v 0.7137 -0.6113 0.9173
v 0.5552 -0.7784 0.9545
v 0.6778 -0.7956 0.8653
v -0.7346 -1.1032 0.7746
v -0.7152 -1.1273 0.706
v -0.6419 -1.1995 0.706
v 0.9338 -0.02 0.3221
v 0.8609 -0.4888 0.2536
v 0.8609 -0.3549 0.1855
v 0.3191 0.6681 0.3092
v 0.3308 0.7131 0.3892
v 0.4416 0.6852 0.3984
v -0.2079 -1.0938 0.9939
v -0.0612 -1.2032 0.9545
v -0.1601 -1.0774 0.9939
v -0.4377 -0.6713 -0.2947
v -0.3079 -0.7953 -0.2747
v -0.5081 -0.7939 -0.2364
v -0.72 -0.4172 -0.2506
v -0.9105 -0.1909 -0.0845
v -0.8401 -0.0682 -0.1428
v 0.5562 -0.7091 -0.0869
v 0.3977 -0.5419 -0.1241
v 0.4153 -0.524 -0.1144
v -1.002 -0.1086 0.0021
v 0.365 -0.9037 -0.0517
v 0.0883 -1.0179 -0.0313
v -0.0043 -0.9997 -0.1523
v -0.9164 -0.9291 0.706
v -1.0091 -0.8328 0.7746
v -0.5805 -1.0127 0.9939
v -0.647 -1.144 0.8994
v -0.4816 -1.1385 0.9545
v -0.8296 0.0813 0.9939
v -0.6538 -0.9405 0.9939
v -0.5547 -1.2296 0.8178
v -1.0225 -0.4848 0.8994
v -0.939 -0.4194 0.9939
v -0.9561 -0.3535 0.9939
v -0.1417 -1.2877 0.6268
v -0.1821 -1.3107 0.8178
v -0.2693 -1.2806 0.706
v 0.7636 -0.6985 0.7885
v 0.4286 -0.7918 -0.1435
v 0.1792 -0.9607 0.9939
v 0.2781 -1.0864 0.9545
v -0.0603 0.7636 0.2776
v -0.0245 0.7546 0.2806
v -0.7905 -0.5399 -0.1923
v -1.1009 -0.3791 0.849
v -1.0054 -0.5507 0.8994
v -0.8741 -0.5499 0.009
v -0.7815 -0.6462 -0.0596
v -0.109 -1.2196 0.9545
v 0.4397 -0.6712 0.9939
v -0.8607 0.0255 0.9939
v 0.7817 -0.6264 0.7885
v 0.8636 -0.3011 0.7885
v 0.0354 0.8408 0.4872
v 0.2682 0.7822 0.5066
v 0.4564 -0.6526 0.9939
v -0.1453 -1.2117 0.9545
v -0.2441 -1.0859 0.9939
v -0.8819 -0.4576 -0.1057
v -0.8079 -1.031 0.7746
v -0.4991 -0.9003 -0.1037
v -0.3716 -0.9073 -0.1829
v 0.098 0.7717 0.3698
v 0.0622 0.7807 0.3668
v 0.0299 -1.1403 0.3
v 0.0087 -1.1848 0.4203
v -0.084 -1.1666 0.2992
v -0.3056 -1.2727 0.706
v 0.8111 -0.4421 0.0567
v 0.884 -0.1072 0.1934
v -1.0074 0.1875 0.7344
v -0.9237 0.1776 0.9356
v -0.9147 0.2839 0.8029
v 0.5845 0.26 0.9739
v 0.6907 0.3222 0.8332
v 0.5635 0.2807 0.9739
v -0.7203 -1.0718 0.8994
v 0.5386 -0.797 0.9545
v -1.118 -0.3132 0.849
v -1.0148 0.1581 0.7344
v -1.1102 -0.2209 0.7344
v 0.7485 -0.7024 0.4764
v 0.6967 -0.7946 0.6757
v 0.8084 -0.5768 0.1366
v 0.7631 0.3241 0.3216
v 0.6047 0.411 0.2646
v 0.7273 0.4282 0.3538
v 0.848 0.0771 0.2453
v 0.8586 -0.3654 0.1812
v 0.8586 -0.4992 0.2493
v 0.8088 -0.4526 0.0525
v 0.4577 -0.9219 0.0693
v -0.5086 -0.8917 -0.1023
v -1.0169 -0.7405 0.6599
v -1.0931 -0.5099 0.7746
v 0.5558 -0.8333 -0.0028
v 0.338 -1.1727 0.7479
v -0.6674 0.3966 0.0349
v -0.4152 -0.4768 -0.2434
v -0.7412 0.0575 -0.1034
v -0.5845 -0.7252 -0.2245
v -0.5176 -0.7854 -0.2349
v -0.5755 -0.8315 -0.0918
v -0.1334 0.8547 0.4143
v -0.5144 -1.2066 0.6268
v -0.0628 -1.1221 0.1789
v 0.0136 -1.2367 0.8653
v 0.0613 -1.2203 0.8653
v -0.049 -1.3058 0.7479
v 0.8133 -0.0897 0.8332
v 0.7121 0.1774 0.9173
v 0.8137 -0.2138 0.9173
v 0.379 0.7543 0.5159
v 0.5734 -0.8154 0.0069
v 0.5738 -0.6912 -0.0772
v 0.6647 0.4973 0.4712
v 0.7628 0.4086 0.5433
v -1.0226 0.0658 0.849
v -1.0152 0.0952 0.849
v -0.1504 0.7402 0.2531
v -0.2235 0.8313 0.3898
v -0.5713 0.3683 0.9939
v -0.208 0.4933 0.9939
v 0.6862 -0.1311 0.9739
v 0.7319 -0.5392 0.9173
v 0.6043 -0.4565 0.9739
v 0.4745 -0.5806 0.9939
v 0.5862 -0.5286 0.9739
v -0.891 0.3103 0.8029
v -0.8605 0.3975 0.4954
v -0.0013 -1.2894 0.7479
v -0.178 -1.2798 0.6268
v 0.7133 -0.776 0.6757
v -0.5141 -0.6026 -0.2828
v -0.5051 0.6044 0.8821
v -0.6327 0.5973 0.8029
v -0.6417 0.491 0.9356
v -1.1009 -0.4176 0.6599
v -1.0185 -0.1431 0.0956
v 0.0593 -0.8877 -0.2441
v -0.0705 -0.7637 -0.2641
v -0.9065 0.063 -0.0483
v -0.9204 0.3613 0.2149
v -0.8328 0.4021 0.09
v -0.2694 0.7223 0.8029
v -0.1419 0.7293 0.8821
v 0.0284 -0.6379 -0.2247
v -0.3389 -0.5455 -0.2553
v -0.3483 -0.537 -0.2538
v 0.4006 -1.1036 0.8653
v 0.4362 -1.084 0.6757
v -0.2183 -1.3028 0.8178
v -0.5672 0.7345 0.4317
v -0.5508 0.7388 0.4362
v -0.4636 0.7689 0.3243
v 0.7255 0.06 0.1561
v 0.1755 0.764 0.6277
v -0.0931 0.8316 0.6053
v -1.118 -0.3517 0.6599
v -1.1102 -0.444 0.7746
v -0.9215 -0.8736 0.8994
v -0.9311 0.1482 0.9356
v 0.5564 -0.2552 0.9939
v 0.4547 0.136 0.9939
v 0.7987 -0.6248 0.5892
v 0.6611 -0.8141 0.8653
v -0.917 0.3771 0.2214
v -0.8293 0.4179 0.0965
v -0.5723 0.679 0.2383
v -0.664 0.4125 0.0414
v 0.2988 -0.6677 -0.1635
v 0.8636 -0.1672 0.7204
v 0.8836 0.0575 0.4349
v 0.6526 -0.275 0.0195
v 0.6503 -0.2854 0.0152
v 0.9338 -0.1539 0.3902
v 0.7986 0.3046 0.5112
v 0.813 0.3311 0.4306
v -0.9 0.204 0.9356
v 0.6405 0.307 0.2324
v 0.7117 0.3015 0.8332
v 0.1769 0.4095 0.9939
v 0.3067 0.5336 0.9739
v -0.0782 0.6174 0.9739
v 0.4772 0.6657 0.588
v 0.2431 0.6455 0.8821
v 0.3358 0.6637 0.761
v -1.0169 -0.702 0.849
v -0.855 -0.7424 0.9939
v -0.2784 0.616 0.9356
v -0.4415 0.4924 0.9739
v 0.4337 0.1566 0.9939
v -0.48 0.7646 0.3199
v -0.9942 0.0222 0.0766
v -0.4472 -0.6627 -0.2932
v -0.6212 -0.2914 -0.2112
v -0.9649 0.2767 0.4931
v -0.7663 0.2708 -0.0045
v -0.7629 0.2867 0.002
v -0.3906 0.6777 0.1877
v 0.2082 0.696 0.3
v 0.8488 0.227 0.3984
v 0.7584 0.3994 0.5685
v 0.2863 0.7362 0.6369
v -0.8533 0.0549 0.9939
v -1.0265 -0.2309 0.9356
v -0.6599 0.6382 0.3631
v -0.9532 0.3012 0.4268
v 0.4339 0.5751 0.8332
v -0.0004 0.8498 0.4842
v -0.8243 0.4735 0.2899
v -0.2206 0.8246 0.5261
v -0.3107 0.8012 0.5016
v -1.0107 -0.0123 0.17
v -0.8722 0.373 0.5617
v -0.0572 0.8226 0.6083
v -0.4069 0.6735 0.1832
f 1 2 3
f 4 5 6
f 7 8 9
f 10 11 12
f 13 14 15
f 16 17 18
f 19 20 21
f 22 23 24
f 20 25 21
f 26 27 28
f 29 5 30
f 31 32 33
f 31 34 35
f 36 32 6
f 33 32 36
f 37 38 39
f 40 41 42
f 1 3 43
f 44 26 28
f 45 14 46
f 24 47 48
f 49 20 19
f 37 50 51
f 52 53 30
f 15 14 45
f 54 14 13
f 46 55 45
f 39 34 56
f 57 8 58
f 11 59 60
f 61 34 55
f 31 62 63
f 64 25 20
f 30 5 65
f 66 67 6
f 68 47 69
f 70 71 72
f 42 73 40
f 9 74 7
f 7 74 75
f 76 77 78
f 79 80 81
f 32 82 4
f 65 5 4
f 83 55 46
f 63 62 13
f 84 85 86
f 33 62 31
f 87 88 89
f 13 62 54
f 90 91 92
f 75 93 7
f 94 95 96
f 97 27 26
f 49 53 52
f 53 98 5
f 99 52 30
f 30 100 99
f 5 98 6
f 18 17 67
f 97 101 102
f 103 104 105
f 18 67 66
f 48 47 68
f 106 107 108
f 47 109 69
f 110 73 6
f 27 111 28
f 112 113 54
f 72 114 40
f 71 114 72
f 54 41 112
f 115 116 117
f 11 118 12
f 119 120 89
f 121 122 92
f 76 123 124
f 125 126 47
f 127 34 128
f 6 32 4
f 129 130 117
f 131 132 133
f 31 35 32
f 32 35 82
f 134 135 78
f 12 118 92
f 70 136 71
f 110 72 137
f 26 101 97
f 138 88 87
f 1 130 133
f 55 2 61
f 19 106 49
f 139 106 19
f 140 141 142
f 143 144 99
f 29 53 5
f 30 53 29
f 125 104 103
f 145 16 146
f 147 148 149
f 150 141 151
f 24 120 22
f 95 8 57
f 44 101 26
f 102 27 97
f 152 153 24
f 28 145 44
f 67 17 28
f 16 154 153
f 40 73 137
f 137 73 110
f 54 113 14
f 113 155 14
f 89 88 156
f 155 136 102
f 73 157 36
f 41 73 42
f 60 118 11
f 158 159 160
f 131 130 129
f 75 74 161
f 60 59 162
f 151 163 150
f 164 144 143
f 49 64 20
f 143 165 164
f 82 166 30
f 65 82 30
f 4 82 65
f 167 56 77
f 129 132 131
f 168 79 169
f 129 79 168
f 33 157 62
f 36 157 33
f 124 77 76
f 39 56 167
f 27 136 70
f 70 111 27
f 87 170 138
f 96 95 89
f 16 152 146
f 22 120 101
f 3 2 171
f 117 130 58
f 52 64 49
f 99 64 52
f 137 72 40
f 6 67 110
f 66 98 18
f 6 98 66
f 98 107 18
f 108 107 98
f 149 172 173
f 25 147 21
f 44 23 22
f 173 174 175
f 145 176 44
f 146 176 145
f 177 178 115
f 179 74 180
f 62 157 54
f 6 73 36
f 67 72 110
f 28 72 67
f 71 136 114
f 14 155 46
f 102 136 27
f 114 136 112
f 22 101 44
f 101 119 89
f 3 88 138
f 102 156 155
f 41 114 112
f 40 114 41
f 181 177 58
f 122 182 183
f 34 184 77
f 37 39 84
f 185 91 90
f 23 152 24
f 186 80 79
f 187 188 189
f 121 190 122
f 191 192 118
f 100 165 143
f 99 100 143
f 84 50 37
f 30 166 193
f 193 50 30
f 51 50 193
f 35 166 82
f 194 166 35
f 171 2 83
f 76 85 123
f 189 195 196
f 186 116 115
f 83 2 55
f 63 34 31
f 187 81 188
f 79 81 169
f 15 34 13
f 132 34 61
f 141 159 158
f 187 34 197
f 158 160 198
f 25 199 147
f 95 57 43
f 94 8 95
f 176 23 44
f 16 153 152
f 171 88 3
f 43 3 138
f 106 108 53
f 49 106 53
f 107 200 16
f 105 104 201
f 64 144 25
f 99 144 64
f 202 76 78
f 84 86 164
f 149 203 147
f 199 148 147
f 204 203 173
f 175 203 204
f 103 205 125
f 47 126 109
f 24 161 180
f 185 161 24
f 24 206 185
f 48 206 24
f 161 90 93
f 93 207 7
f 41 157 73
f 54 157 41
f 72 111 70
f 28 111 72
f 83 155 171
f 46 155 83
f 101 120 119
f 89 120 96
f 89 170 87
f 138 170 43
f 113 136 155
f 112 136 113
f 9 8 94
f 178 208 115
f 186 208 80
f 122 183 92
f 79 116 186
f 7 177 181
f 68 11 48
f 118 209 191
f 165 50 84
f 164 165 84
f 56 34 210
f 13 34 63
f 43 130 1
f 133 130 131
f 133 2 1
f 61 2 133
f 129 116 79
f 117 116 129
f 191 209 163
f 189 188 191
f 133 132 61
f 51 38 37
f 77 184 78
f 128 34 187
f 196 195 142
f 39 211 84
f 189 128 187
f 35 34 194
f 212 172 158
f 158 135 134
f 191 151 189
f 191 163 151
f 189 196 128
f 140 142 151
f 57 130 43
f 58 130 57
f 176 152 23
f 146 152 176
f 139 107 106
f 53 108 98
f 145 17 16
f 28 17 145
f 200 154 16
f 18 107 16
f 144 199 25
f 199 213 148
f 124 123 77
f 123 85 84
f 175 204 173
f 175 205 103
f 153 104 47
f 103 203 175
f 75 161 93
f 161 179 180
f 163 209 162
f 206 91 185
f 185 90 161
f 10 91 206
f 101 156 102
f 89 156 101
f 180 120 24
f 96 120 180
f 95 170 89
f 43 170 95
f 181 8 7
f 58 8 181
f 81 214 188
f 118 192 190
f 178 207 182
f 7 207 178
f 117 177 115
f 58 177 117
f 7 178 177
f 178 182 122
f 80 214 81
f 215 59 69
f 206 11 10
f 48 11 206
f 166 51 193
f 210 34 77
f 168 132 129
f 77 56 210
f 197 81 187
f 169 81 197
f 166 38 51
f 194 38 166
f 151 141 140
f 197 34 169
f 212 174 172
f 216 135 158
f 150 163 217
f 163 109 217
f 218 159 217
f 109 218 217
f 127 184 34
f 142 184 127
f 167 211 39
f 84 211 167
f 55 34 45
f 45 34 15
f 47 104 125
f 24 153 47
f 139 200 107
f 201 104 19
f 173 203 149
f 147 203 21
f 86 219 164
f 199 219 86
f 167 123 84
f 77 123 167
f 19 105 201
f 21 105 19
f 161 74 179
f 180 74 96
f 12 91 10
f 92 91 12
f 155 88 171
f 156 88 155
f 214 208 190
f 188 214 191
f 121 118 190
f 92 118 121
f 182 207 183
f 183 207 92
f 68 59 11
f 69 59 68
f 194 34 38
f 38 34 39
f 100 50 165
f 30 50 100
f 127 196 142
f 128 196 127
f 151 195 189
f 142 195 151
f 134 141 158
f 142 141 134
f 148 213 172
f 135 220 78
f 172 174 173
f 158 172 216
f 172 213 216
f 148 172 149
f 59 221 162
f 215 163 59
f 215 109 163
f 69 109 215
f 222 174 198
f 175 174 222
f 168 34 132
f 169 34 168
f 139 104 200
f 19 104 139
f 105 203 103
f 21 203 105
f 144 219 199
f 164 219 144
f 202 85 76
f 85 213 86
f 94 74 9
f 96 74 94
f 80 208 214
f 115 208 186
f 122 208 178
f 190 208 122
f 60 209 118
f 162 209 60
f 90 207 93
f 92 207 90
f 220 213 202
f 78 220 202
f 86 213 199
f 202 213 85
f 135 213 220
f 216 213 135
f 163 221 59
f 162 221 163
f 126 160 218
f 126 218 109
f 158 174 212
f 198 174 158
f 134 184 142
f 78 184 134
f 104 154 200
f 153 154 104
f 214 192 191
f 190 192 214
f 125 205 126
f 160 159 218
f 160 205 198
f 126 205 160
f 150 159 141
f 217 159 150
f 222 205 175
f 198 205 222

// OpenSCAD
    ////////////////////////////////////////////////////////
    /*
    unionRound() 1.0 Module by Torleif Ceder - TLC123 late summer 2021
     Pretty fast Union with radius, But limited to a subset of cases
    Usage 
     unionRound( radius , detail  )
        {
         YourObject1();
         YourObject2(); 
        } 
      unionRoundMask (r, detail , epsilon ,showMask )
        {
         YourObject1();
         YourObject2(); 
         YourMask();
         YourMask();   
         
         // ...
         // ...
         // ...
         
        } 
    limitations: 
     0. Only really fast when boolean operands are convex, 
            Minkowski is fast in that case. 
     1. Boolean operands may be concave but can only touch 
            in a single convex area
     2. Radius is of elliptic type and is only approximate r
            were operand intersect at perpendicular angle. 
    */
    //////////////////////////////////////////////////////// 
    // Demo code
    demo= true;
    if (demo)  
     unionIntersection(.25, 5) {
     cube([10,10,2],true);
     rotate([20,-10,0])cylinder(5,1,1,$fn=12);   
//     cube([1.5,10,6],center=true); //mask
//      rotate(90)
//     cube([1.5,10,6],center=true); //mask
    }
    
    // end of demo code
    //
 module unionRoundMask(r, detail = 5, epsilon = 1e-6, showMask = true) {
    //automask if none
    if($children <=2){
        unionRoundMask(r,detail,epsilon,showMask)
        {
            children(0);
            children(1);
            clad(r) intersection(){
                    children(0);
                    children(1);
                }
            }
            }
    else {
    union() {
        children(0);
        children(1);
        if (showMask && $children > 2) %
            for (i = [2: max(2, $children - 1)]) children(i);

        if ($children > 2)
            for (i = [2: max(2, $children - 1)]) {
                intersection() {
                    children(i);

                    unionRound(r, detail, epsilon) {
                        intersection() {
                            children(0);
                            children(i); // mask
                        }
                        intersection() {
                            children(1);
                            children(i); // mask
                        }
                    }
                }
            }
        }
     }
}
    
    
    module unionRound(r, detail = 5,  epsilon = 1e-6) {
        
        children(0);
        children(1);
        step = 90 / detail;
      union()for (i = [0:  detail-1]) {
            {
                x = r - sin(i * step ) * r;
                y = r - cos(i * step ) * r;
                xi = r - sin((i * step + step)  ) * r;
                yi = r - cos((i * step + step)  ) * r;
                color(rands(0, 1, 3, i))
                hull() {
                    intersection() {
                        // shell(epsilon) 
                        clad(x) children(0);
                        // shell(epsilon) 
                        clad(y) children(1);
                    }
                    intersection() {
                        // shell(epsilon) 
                        clad(xi) children(0);
                        // shell(epsilon) 
                        clad(yi) children(1);
                    }
                }
            }
        }
    }
    
      module unionIntersection(r, detail = 5,  epsilon = 1e-6) {
        
        
//        step = 90 / detail;
//      union()for (i = [0:  detail-1]) {
//            {
//                x = r - sin(i * step ) * r;
//                y = r - cos(i * step ) * r;
//                xi = r - sin((i * step + step)  ) * r;
//                yi = r - cos((i * step + step)  ) * r;
//                color(rands(0, 1, 3, i))
//                hull() {
                    clad(r,30) inset(r,70)
                          intersection() {
                           children(0);
                           children(1);
                    }
//                    inset(1)intersection() {
//                           children(0);
//                           children(1);
//                    }
//                }
//            }
//        }
    }
    
    // unionRound helper expand by r
    module clad(r,q=70) {
        minkowski() {
            children();
            //        icosphere(r,2);
             isosphere(r,q); 
        }
    }
    // unionRound helper
    module shell(r,q=70) {
        difference() {
            clad(r,q) children();
            children();
        }
    }
    
    // inset 3d  "negative offset", optimally on convex hull
    // else jagged inner corners by q quality factor 
    module inset(r,q=20){
    a= generatepoints(q)*r;
    //#children();
    intersection_for(t=a){
      translate(t ) children();
    }
}
    
    
    /*    
    // The following is a sphere with some equidistant properties.
    // Not strictly necessary

    Kogan, Jonathan (2017) "A New Computationally Efficient Method for Spacing n Points on a Sphere," Rose-Hulman Undergraduate Mathematics Journal: Vol. 18 : Iss. 2 , Article 5.
    Available at: https://scholar.rose-hulman.edu/rhumj/vol18/iss2/5 */
    
    function sphericalcoordinate(x,y)=  [cos(x  )*cos(y  ), sin(x  )*cos(y  ), sin(y  )];
    function NX(n,x)= 
    let(toDeg=57.2958,PI=acos(-1)/toDeg,
    start=(-1.+1./(n-1.)),increment=(2.-2./(n-1.))/(n-1.) )
    [ for (j= [0:n-1])let (s=start+j*increment )
    sphericalcoordinate(   s*x*toDeg,  PI/2.* sign(s)*(1.-sqrt(1.-abs(s)))*toDeg)];
    function generatepoints(n)= NX(n,0.1+1.2*n);
    module isosphere(r,detail){
    a= generatepoints(detail);
    scale(r)hull()polyhedron(a,[[for(i=[0:len(a)-1])i]]);
    }
